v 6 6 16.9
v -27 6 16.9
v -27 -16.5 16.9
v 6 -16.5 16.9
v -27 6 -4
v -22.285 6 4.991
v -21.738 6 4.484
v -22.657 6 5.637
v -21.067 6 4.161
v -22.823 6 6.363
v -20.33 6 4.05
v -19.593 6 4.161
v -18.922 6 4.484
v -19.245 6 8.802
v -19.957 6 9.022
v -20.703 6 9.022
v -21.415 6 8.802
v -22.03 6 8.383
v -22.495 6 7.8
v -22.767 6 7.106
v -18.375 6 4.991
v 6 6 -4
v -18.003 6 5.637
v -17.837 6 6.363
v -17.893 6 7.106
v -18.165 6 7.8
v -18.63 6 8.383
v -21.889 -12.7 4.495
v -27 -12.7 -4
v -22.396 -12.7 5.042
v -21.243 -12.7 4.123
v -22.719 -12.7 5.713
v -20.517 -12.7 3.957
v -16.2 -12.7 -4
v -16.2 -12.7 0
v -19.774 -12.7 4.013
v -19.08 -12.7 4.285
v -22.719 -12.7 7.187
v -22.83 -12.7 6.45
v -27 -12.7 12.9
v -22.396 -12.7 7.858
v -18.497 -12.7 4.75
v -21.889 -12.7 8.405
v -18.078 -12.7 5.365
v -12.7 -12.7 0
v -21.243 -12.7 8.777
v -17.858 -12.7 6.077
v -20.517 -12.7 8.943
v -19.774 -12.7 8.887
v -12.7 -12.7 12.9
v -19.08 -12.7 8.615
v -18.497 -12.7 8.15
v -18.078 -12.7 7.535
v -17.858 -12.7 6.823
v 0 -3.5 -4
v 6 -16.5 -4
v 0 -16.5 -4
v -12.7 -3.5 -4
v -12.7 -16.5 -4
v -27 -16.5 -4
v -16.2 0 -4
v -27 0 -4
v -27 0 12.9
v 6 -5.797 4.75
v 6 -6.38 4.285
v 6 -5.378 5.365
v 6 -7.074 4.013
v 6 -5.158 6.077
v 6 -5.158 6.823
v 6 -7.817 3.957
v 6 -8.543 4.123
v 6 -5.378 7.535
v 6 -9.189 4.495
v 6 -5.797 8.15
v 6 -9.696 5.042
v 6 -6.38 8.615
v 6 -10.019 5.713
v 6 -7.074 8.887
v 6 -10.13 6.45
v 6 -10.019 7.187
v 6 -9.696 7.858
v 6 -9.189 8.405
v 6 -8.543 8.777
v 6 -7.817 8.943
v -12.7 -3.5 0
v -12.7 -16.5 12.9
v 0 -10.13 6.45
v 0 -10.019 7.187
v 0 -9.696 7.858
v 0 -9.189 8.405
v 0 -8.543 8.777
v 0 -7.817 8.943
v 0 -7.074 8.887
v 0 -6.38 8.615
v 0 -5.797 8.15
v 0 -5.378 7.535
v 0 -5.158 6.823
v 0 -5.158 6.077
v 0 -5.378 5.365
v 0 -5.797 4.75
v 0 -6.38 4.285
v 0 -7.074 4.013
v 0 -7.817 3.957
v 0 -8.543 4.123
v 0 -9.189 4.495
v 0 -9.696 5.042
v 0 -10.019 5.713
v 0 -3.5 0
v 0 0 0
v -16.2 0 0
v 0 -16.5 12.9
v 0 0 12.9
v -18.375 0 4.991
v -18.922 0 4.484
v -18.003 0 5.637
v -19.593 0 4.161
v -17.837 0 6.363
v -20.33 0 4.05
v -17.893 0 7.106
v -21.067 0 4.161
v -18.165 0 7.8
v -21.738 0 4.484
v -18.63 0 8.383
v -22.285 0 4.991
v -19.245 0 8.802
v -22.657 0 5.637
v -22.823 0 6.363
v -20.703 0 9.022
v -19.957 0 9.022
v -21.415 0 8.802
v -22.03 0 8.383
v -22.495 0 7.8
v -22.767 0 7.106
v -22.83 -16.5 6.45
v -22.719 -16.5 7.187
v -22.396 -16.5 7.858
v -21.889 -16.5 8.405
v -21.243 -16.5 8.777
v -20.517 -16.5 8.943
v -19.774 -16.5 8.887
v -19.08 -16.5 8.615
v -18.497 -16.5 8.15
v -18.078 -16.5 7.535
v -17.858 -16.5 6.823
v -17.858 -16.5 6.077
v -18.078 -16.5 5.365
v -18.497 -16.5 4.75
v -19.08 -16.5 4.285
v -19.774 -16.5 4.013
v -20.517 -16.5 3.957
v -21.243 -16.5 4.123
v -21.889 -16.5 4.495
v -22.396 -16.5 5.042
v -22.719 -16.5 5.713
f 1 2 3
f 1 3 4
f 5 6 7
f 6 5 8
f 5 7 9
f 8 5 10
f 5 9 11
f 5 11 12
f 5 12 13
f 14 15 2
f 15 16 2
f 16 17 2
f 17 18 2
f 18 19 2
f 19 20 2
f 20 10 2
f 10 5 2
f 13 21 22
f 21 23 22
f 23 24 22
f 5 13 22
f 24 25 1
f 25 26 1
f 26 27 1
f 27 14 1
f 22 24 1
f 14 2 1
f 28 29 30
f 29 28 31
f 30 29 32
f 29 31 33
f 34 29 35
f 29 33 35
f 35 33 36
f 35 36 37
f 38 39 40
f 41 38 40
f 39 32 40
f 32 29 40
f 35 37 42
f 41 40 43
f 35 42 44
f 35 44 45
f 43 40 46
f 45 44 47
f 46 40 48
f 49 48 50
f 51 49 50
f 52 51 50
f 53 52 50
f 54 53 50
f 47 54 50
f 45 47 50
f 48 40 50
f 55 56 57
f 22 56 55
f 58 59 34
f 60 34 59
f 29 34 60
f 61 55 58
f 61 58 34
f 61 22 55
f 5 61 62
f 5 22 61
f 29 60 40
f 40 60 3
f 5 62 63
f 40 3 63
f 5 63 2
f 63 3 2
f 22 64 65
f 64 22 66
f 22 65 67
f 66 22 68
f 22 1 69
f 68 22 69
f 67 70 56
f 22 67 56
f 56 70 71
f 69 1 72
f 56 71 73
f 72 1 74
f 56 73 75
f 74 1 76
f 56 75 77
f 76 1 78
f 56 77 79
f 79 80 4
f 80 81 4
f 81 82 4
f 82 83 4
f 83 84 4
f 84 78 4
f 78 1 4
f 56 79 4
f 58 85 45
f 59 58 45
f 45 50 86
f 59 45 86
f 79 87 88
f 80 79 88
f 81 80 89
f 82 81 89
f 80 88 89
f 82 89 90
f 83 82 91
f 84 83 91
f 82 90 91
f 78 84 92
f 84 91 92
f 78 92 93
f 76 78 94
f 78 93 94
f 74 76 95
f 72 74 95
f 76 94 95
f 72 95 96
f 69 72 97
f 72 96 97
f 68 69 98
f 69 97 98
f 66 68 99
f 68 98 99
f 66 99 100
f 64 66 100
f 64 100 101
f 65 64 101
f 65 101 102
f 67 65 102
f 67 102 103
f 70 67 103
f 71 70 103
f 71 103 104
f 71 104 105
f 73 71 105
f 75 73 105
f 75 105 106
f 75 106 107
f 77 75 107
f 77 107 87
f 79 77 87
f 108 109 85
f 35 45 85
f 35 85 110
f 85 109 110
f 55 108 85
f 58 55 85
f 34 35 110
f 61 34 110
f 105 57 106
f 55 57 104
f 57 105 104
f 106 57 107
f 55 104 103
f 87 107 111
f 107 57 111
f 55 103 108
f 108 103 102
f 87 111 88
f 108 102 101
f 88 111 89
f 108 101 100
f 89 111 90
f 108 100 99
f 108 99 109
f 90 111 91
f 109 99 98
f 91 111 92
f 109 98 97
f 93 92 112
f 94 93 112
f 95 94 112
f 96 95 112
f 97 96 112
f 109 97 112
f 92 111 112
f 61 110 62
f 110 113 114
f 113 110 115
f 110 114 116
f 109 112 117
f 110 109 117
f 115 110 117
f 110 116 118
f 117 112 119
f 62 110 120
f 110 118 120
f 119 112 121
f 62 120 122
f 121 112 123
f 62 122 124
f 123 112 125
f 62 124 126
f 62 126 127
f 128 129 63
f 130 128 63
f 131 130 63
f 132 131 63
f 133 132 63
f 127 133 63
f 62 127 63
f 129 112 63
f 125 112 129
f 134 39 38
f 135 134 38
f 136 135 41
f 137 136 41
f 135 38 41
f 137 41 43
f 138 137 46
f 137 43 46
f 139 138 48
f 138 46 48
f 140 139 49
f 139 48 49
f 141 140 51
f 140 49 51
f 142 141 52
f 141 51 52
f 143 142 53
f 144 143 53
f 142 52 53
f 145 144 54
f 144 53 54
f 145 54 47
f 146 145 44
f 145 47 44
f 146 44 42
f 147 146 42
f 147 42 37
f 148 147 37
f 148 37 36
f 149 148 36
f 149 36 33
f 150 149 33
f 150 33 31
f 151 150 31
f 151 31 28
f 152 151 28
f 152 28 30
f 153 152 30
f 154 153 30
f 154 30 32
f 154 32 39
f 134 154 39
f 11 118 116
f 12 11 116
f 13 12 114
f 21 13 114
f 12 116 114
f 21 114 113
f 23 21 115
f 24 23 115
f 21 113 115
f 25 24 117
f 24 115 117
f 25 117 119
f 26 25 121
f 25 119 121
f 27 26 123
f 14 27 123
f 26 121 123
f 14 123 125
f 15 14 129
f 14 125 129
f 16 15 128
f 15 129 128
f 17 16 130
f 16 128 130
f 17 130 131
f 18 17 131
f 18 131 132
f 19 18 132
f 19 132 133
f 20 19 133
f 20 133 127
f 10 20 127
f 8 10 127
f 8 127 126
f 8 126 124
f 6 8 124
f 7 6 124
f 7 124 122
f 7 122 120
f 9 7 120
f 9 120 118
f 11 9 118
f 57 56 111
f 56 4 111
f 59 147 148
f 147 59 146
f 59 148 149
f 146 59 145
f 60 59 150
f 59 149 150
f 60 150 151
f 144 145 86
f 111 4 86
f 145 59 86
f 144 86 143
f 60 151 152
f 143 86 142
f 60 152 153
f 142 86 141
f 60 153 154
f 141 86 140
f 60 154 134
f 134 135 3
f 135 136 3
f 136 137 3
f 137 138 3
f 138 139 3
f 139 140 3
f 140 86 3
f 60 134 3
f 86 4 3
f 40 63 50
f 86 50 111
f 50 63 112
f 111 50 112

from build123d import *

# Parameters (mm, degrees)
BOSS_EXTRUDE1_DEPTH = 12.9
SKETCH2_R           = 2.5
CUT_EXTRUDE1_DEPTH  = 38.288201887
SKETCH3_R           = 2.5
CUT_EXTRUDE2_DEPTH  = 38.288201887
SKETCH5_W           = 36
SKETCH5_H           = 24
BOSS_EXTRUDE3_DEPTH = 4
SKETCH6_W           = 17.3
SKETCH6_H           = 5.3
BOSS_EXTRUDE4_DEPTH = 12.9
SKETCH7_R           = 2.5
CUT_EXTRUDE3_DEPTH  = 40.182904435
EXTRUDE_3_DEPTH     = 4
SKETCH_5_W          = 3
SKETCH_5_H          = 20.9
CUT_EXTRUDE_1_DEPTH = 42.971537975
CUT_EXTRUDE_2_DEPTH = 4
SKETCH_7_W          = 16.9
SKETCH_7_H          = 1.5
CUT_EXTRUDE_3_DEPTH = 20
CUT_EXTRUDE5_REACH  = 40.998
SKETCH8_W           = 1.3
SKETCH8_H           = 12.9
SKETCH_9_W          = 4
SKETCH_9_H          = 24
CUT_EXTRUDE_4_DEPTH = 42.214196583
SKETCH_11_W         = 16.9
SKETCH_11_H         = 1.5
CUT_EXTRUDE_6_DEPTH = 32.774360733
SKETCH_13_W         = 12.9
SKETCH_13_H         = 3.8
EXTRUDE_5_DEPTH     = 1.3
EXTRUDE_6_DEPTH     = 4


with BuildPart() as part:
    # Sketch1 → Boss-Extrude1 (new body)
    with BuildSketch(Plane.XY):
        Polygon((-30, 0), (-30, 6), (6, 6), (6, -18), (0, -18), (0, 0), align=None)
    extrude(amount=BOSS_EXTRUDE1_DEPTH)

    # Sketch2 → Cut-Extrude1 (cut, through all)
    with BuildSketch(Plane.XZ):
        with Locations(Location((-20.33, 6.55, 0), (0, 0, 270))):
            Circle(SKETCH2_R)
    extrude(amount=-CUT_EXTRUDE1_DEPTH, mode=Mode.SUBTRACT)

    # Sketch3 → Cut-Extrude2 (cut, through all)
    with BuildSketch(Plane.ZY):
        with Locations(Location((6.45, -7.63, 0), (0, 0, 270))):
            Circle(SKETCH3_R)
    extrude(amount=-CUT_EXTRUDE2_DEPTH, mode=Mode.SUBTRACT)

    # Sketch5 → Boss-Extrude3 (add)
    with BuildSketch(Plane.XY.offset(12.9)):
        with Locations((-12, -6)):
            Rectangle(SKETCH5_W, SKETCH5_H)
    extrude(amount=BOSS_EXTRUDE3_DEPTH)

    # Sketch6 → Boss-Extrude4 (add)
    with BuildSketch(Plane(origin=(0, 0, 12.9), x_dir=(-1, 0, 0), z_dir=(0, 0, -1))):
        with Locations((21.35, -15.35)):
            Rectangle(SKETCH6_W, SKETCH6_H)
    extrude(amount=BOSS_EXTRUDE4_DEPTH)

    # Sketch7 → Cut-Extrude3 (cut, through all)
    with BuildSketch(Plane(origin=(0, -12.7, 0), x_dir=(1, 0, 0), z_dir=(0, 1, 0))):
        with Locations(Location((-20.33, -6.45, 0), (0, 0, 180))):
            Circle(SKETCH7_R)
    extrude(amount=-CUT_EXTRUDE3_DEPTH, mode=Mode.SUBTRACT)

    # 草图4 → 凸台-拉伸3 (add)
    with BuildSketch(Plane(origin=(0, 0, 0), x_dir=(-1, 0, 0), z_dir=(0, 0, -1))):
        Polygon((30, 6), (9, 6), (9, -4), (11, -4), (11, -18), (30, -18), align=None)
    extrude(amount=EXTRUDE_3_DEPTH)

    # 草图5 → 切除-拉伸1 (cut, through all)
    with BuildSketch(Plane.XZ.offset(18)):
        with Locations((-28.5, 6.45)):
            Rectangle(SKETCH_5_W, SKETCH_5_H)
    extrude(amount=-CUT_EXTRUDE_1_DEPTH, mode=Mode.SUBTRACT)

    # 草图6 → 切除-拉伸2 (cut)
    with BuildSketch(Plane(origin=(0, 0, -4), x_dir=(-1, 0, 0), z_dir=(0, 0, -1))):
        Polygon((11, -18), (11, -14), (13.1, -18), align=None)
    extrude(amount=-CUT_EXTRUDE_2_DEPTH, mode=Mode.SUBTRACT)

    # 草图7 → 切除-拉伸3 (cut)
    with BuildSketch(Plane(origin=(6, 0, 0), x_dir=(0, 0, -1), z_dir=(1, 0, 0))):
        with Locations((-8.45, -17.25)):
            Rectangle(SKETCH_7_W, SKETCH_7_H)
    extrude(amount=-CUT_EXTRUDE_3_DEPTH, mode=Mode.SUBTRACT)

    # Sketch8 → Cut-Extrude5 (cut, up to next)
    with BuildSketch(Plane.XZ.offset(16.5), mode=Mode.PRIVATE) as cut_extrude5_sk1:
        with Locations((-13.35, 6.45)):
            Rectangle(SKETCH8_W, SKETCH8_H)
    cut_extrude5_tool1 = extrude(cut_extrude5_sk1.sketch, amount=-CUT_EXTRUDE5_REACH, mode=Mode.PRIVATE) & part.part
    add(cut_extrude5_tool1.solids().sort_by_distance((-13.35, -16.5, 6.45))[0], mode=Mode.SUBTRACT)

    # 草图9 → 切除-拉伸4 (cut, through all)
    with BuildSketch(Plane(origin=(6, 0, 0), x_dir=(0, 0, -1), z_dir=(1, 0, 0))):
        with Locations((2, -6)):
            Rectangle(SKETCH_9_W, SKETCH_9_H)
    extrude(amount=-CUT_EXTRUDE_4_DEPTH, mode=Mode.SUBTRACT)

    # 草图11 → 切除-拉伸6 (cut, through all)
    with BuildSketch(Plane(origin=(-14, 0, 0), x_dir=(0, 0, -1), z_dir=(1, 0, 0))):
        with Locations((-8.45, -17.25)):
            Rectangle(SKETCH_11_W, SKETCH_11_H)
    extrude(amount=-CUT_EXTRUDE_6_DEPTH, mode=Mode.SUBTRACT)

    # 草图13 → 凸台-拉伸5 (add)
    with BuildSketch(Plane(origin=(-14, 0, 0), x_dir=(0, 0, -1), z_dir=(1, 0, 0))):
        with Locations((-6.45, -14.6)):
            Rectangle(SKETCH_13_W, SKETCH_13_H)
    extrude(amount=EXTRUDE_5_DEPTH)

    # 草图17 → 凸台-拉伸6 (add)
    with BuildSketch(Plane(origin=(0, 0, 0), x_dir=(-1, 0, 0), z_dir=(0, 0, -1))):
        Polygon((27, 6), (-6, 6), (-6, -16.5), (0, -16.5), (0, -3.5), (12.7, -3.5), (12.7, -16.5), (27, -16.5), (27, -12.7), (16.2, -12.7), (16.2, 0), (27, 0), align=None)
    extrude(amount=EXTRUDE_6_DEPTH)


solid = part.part
